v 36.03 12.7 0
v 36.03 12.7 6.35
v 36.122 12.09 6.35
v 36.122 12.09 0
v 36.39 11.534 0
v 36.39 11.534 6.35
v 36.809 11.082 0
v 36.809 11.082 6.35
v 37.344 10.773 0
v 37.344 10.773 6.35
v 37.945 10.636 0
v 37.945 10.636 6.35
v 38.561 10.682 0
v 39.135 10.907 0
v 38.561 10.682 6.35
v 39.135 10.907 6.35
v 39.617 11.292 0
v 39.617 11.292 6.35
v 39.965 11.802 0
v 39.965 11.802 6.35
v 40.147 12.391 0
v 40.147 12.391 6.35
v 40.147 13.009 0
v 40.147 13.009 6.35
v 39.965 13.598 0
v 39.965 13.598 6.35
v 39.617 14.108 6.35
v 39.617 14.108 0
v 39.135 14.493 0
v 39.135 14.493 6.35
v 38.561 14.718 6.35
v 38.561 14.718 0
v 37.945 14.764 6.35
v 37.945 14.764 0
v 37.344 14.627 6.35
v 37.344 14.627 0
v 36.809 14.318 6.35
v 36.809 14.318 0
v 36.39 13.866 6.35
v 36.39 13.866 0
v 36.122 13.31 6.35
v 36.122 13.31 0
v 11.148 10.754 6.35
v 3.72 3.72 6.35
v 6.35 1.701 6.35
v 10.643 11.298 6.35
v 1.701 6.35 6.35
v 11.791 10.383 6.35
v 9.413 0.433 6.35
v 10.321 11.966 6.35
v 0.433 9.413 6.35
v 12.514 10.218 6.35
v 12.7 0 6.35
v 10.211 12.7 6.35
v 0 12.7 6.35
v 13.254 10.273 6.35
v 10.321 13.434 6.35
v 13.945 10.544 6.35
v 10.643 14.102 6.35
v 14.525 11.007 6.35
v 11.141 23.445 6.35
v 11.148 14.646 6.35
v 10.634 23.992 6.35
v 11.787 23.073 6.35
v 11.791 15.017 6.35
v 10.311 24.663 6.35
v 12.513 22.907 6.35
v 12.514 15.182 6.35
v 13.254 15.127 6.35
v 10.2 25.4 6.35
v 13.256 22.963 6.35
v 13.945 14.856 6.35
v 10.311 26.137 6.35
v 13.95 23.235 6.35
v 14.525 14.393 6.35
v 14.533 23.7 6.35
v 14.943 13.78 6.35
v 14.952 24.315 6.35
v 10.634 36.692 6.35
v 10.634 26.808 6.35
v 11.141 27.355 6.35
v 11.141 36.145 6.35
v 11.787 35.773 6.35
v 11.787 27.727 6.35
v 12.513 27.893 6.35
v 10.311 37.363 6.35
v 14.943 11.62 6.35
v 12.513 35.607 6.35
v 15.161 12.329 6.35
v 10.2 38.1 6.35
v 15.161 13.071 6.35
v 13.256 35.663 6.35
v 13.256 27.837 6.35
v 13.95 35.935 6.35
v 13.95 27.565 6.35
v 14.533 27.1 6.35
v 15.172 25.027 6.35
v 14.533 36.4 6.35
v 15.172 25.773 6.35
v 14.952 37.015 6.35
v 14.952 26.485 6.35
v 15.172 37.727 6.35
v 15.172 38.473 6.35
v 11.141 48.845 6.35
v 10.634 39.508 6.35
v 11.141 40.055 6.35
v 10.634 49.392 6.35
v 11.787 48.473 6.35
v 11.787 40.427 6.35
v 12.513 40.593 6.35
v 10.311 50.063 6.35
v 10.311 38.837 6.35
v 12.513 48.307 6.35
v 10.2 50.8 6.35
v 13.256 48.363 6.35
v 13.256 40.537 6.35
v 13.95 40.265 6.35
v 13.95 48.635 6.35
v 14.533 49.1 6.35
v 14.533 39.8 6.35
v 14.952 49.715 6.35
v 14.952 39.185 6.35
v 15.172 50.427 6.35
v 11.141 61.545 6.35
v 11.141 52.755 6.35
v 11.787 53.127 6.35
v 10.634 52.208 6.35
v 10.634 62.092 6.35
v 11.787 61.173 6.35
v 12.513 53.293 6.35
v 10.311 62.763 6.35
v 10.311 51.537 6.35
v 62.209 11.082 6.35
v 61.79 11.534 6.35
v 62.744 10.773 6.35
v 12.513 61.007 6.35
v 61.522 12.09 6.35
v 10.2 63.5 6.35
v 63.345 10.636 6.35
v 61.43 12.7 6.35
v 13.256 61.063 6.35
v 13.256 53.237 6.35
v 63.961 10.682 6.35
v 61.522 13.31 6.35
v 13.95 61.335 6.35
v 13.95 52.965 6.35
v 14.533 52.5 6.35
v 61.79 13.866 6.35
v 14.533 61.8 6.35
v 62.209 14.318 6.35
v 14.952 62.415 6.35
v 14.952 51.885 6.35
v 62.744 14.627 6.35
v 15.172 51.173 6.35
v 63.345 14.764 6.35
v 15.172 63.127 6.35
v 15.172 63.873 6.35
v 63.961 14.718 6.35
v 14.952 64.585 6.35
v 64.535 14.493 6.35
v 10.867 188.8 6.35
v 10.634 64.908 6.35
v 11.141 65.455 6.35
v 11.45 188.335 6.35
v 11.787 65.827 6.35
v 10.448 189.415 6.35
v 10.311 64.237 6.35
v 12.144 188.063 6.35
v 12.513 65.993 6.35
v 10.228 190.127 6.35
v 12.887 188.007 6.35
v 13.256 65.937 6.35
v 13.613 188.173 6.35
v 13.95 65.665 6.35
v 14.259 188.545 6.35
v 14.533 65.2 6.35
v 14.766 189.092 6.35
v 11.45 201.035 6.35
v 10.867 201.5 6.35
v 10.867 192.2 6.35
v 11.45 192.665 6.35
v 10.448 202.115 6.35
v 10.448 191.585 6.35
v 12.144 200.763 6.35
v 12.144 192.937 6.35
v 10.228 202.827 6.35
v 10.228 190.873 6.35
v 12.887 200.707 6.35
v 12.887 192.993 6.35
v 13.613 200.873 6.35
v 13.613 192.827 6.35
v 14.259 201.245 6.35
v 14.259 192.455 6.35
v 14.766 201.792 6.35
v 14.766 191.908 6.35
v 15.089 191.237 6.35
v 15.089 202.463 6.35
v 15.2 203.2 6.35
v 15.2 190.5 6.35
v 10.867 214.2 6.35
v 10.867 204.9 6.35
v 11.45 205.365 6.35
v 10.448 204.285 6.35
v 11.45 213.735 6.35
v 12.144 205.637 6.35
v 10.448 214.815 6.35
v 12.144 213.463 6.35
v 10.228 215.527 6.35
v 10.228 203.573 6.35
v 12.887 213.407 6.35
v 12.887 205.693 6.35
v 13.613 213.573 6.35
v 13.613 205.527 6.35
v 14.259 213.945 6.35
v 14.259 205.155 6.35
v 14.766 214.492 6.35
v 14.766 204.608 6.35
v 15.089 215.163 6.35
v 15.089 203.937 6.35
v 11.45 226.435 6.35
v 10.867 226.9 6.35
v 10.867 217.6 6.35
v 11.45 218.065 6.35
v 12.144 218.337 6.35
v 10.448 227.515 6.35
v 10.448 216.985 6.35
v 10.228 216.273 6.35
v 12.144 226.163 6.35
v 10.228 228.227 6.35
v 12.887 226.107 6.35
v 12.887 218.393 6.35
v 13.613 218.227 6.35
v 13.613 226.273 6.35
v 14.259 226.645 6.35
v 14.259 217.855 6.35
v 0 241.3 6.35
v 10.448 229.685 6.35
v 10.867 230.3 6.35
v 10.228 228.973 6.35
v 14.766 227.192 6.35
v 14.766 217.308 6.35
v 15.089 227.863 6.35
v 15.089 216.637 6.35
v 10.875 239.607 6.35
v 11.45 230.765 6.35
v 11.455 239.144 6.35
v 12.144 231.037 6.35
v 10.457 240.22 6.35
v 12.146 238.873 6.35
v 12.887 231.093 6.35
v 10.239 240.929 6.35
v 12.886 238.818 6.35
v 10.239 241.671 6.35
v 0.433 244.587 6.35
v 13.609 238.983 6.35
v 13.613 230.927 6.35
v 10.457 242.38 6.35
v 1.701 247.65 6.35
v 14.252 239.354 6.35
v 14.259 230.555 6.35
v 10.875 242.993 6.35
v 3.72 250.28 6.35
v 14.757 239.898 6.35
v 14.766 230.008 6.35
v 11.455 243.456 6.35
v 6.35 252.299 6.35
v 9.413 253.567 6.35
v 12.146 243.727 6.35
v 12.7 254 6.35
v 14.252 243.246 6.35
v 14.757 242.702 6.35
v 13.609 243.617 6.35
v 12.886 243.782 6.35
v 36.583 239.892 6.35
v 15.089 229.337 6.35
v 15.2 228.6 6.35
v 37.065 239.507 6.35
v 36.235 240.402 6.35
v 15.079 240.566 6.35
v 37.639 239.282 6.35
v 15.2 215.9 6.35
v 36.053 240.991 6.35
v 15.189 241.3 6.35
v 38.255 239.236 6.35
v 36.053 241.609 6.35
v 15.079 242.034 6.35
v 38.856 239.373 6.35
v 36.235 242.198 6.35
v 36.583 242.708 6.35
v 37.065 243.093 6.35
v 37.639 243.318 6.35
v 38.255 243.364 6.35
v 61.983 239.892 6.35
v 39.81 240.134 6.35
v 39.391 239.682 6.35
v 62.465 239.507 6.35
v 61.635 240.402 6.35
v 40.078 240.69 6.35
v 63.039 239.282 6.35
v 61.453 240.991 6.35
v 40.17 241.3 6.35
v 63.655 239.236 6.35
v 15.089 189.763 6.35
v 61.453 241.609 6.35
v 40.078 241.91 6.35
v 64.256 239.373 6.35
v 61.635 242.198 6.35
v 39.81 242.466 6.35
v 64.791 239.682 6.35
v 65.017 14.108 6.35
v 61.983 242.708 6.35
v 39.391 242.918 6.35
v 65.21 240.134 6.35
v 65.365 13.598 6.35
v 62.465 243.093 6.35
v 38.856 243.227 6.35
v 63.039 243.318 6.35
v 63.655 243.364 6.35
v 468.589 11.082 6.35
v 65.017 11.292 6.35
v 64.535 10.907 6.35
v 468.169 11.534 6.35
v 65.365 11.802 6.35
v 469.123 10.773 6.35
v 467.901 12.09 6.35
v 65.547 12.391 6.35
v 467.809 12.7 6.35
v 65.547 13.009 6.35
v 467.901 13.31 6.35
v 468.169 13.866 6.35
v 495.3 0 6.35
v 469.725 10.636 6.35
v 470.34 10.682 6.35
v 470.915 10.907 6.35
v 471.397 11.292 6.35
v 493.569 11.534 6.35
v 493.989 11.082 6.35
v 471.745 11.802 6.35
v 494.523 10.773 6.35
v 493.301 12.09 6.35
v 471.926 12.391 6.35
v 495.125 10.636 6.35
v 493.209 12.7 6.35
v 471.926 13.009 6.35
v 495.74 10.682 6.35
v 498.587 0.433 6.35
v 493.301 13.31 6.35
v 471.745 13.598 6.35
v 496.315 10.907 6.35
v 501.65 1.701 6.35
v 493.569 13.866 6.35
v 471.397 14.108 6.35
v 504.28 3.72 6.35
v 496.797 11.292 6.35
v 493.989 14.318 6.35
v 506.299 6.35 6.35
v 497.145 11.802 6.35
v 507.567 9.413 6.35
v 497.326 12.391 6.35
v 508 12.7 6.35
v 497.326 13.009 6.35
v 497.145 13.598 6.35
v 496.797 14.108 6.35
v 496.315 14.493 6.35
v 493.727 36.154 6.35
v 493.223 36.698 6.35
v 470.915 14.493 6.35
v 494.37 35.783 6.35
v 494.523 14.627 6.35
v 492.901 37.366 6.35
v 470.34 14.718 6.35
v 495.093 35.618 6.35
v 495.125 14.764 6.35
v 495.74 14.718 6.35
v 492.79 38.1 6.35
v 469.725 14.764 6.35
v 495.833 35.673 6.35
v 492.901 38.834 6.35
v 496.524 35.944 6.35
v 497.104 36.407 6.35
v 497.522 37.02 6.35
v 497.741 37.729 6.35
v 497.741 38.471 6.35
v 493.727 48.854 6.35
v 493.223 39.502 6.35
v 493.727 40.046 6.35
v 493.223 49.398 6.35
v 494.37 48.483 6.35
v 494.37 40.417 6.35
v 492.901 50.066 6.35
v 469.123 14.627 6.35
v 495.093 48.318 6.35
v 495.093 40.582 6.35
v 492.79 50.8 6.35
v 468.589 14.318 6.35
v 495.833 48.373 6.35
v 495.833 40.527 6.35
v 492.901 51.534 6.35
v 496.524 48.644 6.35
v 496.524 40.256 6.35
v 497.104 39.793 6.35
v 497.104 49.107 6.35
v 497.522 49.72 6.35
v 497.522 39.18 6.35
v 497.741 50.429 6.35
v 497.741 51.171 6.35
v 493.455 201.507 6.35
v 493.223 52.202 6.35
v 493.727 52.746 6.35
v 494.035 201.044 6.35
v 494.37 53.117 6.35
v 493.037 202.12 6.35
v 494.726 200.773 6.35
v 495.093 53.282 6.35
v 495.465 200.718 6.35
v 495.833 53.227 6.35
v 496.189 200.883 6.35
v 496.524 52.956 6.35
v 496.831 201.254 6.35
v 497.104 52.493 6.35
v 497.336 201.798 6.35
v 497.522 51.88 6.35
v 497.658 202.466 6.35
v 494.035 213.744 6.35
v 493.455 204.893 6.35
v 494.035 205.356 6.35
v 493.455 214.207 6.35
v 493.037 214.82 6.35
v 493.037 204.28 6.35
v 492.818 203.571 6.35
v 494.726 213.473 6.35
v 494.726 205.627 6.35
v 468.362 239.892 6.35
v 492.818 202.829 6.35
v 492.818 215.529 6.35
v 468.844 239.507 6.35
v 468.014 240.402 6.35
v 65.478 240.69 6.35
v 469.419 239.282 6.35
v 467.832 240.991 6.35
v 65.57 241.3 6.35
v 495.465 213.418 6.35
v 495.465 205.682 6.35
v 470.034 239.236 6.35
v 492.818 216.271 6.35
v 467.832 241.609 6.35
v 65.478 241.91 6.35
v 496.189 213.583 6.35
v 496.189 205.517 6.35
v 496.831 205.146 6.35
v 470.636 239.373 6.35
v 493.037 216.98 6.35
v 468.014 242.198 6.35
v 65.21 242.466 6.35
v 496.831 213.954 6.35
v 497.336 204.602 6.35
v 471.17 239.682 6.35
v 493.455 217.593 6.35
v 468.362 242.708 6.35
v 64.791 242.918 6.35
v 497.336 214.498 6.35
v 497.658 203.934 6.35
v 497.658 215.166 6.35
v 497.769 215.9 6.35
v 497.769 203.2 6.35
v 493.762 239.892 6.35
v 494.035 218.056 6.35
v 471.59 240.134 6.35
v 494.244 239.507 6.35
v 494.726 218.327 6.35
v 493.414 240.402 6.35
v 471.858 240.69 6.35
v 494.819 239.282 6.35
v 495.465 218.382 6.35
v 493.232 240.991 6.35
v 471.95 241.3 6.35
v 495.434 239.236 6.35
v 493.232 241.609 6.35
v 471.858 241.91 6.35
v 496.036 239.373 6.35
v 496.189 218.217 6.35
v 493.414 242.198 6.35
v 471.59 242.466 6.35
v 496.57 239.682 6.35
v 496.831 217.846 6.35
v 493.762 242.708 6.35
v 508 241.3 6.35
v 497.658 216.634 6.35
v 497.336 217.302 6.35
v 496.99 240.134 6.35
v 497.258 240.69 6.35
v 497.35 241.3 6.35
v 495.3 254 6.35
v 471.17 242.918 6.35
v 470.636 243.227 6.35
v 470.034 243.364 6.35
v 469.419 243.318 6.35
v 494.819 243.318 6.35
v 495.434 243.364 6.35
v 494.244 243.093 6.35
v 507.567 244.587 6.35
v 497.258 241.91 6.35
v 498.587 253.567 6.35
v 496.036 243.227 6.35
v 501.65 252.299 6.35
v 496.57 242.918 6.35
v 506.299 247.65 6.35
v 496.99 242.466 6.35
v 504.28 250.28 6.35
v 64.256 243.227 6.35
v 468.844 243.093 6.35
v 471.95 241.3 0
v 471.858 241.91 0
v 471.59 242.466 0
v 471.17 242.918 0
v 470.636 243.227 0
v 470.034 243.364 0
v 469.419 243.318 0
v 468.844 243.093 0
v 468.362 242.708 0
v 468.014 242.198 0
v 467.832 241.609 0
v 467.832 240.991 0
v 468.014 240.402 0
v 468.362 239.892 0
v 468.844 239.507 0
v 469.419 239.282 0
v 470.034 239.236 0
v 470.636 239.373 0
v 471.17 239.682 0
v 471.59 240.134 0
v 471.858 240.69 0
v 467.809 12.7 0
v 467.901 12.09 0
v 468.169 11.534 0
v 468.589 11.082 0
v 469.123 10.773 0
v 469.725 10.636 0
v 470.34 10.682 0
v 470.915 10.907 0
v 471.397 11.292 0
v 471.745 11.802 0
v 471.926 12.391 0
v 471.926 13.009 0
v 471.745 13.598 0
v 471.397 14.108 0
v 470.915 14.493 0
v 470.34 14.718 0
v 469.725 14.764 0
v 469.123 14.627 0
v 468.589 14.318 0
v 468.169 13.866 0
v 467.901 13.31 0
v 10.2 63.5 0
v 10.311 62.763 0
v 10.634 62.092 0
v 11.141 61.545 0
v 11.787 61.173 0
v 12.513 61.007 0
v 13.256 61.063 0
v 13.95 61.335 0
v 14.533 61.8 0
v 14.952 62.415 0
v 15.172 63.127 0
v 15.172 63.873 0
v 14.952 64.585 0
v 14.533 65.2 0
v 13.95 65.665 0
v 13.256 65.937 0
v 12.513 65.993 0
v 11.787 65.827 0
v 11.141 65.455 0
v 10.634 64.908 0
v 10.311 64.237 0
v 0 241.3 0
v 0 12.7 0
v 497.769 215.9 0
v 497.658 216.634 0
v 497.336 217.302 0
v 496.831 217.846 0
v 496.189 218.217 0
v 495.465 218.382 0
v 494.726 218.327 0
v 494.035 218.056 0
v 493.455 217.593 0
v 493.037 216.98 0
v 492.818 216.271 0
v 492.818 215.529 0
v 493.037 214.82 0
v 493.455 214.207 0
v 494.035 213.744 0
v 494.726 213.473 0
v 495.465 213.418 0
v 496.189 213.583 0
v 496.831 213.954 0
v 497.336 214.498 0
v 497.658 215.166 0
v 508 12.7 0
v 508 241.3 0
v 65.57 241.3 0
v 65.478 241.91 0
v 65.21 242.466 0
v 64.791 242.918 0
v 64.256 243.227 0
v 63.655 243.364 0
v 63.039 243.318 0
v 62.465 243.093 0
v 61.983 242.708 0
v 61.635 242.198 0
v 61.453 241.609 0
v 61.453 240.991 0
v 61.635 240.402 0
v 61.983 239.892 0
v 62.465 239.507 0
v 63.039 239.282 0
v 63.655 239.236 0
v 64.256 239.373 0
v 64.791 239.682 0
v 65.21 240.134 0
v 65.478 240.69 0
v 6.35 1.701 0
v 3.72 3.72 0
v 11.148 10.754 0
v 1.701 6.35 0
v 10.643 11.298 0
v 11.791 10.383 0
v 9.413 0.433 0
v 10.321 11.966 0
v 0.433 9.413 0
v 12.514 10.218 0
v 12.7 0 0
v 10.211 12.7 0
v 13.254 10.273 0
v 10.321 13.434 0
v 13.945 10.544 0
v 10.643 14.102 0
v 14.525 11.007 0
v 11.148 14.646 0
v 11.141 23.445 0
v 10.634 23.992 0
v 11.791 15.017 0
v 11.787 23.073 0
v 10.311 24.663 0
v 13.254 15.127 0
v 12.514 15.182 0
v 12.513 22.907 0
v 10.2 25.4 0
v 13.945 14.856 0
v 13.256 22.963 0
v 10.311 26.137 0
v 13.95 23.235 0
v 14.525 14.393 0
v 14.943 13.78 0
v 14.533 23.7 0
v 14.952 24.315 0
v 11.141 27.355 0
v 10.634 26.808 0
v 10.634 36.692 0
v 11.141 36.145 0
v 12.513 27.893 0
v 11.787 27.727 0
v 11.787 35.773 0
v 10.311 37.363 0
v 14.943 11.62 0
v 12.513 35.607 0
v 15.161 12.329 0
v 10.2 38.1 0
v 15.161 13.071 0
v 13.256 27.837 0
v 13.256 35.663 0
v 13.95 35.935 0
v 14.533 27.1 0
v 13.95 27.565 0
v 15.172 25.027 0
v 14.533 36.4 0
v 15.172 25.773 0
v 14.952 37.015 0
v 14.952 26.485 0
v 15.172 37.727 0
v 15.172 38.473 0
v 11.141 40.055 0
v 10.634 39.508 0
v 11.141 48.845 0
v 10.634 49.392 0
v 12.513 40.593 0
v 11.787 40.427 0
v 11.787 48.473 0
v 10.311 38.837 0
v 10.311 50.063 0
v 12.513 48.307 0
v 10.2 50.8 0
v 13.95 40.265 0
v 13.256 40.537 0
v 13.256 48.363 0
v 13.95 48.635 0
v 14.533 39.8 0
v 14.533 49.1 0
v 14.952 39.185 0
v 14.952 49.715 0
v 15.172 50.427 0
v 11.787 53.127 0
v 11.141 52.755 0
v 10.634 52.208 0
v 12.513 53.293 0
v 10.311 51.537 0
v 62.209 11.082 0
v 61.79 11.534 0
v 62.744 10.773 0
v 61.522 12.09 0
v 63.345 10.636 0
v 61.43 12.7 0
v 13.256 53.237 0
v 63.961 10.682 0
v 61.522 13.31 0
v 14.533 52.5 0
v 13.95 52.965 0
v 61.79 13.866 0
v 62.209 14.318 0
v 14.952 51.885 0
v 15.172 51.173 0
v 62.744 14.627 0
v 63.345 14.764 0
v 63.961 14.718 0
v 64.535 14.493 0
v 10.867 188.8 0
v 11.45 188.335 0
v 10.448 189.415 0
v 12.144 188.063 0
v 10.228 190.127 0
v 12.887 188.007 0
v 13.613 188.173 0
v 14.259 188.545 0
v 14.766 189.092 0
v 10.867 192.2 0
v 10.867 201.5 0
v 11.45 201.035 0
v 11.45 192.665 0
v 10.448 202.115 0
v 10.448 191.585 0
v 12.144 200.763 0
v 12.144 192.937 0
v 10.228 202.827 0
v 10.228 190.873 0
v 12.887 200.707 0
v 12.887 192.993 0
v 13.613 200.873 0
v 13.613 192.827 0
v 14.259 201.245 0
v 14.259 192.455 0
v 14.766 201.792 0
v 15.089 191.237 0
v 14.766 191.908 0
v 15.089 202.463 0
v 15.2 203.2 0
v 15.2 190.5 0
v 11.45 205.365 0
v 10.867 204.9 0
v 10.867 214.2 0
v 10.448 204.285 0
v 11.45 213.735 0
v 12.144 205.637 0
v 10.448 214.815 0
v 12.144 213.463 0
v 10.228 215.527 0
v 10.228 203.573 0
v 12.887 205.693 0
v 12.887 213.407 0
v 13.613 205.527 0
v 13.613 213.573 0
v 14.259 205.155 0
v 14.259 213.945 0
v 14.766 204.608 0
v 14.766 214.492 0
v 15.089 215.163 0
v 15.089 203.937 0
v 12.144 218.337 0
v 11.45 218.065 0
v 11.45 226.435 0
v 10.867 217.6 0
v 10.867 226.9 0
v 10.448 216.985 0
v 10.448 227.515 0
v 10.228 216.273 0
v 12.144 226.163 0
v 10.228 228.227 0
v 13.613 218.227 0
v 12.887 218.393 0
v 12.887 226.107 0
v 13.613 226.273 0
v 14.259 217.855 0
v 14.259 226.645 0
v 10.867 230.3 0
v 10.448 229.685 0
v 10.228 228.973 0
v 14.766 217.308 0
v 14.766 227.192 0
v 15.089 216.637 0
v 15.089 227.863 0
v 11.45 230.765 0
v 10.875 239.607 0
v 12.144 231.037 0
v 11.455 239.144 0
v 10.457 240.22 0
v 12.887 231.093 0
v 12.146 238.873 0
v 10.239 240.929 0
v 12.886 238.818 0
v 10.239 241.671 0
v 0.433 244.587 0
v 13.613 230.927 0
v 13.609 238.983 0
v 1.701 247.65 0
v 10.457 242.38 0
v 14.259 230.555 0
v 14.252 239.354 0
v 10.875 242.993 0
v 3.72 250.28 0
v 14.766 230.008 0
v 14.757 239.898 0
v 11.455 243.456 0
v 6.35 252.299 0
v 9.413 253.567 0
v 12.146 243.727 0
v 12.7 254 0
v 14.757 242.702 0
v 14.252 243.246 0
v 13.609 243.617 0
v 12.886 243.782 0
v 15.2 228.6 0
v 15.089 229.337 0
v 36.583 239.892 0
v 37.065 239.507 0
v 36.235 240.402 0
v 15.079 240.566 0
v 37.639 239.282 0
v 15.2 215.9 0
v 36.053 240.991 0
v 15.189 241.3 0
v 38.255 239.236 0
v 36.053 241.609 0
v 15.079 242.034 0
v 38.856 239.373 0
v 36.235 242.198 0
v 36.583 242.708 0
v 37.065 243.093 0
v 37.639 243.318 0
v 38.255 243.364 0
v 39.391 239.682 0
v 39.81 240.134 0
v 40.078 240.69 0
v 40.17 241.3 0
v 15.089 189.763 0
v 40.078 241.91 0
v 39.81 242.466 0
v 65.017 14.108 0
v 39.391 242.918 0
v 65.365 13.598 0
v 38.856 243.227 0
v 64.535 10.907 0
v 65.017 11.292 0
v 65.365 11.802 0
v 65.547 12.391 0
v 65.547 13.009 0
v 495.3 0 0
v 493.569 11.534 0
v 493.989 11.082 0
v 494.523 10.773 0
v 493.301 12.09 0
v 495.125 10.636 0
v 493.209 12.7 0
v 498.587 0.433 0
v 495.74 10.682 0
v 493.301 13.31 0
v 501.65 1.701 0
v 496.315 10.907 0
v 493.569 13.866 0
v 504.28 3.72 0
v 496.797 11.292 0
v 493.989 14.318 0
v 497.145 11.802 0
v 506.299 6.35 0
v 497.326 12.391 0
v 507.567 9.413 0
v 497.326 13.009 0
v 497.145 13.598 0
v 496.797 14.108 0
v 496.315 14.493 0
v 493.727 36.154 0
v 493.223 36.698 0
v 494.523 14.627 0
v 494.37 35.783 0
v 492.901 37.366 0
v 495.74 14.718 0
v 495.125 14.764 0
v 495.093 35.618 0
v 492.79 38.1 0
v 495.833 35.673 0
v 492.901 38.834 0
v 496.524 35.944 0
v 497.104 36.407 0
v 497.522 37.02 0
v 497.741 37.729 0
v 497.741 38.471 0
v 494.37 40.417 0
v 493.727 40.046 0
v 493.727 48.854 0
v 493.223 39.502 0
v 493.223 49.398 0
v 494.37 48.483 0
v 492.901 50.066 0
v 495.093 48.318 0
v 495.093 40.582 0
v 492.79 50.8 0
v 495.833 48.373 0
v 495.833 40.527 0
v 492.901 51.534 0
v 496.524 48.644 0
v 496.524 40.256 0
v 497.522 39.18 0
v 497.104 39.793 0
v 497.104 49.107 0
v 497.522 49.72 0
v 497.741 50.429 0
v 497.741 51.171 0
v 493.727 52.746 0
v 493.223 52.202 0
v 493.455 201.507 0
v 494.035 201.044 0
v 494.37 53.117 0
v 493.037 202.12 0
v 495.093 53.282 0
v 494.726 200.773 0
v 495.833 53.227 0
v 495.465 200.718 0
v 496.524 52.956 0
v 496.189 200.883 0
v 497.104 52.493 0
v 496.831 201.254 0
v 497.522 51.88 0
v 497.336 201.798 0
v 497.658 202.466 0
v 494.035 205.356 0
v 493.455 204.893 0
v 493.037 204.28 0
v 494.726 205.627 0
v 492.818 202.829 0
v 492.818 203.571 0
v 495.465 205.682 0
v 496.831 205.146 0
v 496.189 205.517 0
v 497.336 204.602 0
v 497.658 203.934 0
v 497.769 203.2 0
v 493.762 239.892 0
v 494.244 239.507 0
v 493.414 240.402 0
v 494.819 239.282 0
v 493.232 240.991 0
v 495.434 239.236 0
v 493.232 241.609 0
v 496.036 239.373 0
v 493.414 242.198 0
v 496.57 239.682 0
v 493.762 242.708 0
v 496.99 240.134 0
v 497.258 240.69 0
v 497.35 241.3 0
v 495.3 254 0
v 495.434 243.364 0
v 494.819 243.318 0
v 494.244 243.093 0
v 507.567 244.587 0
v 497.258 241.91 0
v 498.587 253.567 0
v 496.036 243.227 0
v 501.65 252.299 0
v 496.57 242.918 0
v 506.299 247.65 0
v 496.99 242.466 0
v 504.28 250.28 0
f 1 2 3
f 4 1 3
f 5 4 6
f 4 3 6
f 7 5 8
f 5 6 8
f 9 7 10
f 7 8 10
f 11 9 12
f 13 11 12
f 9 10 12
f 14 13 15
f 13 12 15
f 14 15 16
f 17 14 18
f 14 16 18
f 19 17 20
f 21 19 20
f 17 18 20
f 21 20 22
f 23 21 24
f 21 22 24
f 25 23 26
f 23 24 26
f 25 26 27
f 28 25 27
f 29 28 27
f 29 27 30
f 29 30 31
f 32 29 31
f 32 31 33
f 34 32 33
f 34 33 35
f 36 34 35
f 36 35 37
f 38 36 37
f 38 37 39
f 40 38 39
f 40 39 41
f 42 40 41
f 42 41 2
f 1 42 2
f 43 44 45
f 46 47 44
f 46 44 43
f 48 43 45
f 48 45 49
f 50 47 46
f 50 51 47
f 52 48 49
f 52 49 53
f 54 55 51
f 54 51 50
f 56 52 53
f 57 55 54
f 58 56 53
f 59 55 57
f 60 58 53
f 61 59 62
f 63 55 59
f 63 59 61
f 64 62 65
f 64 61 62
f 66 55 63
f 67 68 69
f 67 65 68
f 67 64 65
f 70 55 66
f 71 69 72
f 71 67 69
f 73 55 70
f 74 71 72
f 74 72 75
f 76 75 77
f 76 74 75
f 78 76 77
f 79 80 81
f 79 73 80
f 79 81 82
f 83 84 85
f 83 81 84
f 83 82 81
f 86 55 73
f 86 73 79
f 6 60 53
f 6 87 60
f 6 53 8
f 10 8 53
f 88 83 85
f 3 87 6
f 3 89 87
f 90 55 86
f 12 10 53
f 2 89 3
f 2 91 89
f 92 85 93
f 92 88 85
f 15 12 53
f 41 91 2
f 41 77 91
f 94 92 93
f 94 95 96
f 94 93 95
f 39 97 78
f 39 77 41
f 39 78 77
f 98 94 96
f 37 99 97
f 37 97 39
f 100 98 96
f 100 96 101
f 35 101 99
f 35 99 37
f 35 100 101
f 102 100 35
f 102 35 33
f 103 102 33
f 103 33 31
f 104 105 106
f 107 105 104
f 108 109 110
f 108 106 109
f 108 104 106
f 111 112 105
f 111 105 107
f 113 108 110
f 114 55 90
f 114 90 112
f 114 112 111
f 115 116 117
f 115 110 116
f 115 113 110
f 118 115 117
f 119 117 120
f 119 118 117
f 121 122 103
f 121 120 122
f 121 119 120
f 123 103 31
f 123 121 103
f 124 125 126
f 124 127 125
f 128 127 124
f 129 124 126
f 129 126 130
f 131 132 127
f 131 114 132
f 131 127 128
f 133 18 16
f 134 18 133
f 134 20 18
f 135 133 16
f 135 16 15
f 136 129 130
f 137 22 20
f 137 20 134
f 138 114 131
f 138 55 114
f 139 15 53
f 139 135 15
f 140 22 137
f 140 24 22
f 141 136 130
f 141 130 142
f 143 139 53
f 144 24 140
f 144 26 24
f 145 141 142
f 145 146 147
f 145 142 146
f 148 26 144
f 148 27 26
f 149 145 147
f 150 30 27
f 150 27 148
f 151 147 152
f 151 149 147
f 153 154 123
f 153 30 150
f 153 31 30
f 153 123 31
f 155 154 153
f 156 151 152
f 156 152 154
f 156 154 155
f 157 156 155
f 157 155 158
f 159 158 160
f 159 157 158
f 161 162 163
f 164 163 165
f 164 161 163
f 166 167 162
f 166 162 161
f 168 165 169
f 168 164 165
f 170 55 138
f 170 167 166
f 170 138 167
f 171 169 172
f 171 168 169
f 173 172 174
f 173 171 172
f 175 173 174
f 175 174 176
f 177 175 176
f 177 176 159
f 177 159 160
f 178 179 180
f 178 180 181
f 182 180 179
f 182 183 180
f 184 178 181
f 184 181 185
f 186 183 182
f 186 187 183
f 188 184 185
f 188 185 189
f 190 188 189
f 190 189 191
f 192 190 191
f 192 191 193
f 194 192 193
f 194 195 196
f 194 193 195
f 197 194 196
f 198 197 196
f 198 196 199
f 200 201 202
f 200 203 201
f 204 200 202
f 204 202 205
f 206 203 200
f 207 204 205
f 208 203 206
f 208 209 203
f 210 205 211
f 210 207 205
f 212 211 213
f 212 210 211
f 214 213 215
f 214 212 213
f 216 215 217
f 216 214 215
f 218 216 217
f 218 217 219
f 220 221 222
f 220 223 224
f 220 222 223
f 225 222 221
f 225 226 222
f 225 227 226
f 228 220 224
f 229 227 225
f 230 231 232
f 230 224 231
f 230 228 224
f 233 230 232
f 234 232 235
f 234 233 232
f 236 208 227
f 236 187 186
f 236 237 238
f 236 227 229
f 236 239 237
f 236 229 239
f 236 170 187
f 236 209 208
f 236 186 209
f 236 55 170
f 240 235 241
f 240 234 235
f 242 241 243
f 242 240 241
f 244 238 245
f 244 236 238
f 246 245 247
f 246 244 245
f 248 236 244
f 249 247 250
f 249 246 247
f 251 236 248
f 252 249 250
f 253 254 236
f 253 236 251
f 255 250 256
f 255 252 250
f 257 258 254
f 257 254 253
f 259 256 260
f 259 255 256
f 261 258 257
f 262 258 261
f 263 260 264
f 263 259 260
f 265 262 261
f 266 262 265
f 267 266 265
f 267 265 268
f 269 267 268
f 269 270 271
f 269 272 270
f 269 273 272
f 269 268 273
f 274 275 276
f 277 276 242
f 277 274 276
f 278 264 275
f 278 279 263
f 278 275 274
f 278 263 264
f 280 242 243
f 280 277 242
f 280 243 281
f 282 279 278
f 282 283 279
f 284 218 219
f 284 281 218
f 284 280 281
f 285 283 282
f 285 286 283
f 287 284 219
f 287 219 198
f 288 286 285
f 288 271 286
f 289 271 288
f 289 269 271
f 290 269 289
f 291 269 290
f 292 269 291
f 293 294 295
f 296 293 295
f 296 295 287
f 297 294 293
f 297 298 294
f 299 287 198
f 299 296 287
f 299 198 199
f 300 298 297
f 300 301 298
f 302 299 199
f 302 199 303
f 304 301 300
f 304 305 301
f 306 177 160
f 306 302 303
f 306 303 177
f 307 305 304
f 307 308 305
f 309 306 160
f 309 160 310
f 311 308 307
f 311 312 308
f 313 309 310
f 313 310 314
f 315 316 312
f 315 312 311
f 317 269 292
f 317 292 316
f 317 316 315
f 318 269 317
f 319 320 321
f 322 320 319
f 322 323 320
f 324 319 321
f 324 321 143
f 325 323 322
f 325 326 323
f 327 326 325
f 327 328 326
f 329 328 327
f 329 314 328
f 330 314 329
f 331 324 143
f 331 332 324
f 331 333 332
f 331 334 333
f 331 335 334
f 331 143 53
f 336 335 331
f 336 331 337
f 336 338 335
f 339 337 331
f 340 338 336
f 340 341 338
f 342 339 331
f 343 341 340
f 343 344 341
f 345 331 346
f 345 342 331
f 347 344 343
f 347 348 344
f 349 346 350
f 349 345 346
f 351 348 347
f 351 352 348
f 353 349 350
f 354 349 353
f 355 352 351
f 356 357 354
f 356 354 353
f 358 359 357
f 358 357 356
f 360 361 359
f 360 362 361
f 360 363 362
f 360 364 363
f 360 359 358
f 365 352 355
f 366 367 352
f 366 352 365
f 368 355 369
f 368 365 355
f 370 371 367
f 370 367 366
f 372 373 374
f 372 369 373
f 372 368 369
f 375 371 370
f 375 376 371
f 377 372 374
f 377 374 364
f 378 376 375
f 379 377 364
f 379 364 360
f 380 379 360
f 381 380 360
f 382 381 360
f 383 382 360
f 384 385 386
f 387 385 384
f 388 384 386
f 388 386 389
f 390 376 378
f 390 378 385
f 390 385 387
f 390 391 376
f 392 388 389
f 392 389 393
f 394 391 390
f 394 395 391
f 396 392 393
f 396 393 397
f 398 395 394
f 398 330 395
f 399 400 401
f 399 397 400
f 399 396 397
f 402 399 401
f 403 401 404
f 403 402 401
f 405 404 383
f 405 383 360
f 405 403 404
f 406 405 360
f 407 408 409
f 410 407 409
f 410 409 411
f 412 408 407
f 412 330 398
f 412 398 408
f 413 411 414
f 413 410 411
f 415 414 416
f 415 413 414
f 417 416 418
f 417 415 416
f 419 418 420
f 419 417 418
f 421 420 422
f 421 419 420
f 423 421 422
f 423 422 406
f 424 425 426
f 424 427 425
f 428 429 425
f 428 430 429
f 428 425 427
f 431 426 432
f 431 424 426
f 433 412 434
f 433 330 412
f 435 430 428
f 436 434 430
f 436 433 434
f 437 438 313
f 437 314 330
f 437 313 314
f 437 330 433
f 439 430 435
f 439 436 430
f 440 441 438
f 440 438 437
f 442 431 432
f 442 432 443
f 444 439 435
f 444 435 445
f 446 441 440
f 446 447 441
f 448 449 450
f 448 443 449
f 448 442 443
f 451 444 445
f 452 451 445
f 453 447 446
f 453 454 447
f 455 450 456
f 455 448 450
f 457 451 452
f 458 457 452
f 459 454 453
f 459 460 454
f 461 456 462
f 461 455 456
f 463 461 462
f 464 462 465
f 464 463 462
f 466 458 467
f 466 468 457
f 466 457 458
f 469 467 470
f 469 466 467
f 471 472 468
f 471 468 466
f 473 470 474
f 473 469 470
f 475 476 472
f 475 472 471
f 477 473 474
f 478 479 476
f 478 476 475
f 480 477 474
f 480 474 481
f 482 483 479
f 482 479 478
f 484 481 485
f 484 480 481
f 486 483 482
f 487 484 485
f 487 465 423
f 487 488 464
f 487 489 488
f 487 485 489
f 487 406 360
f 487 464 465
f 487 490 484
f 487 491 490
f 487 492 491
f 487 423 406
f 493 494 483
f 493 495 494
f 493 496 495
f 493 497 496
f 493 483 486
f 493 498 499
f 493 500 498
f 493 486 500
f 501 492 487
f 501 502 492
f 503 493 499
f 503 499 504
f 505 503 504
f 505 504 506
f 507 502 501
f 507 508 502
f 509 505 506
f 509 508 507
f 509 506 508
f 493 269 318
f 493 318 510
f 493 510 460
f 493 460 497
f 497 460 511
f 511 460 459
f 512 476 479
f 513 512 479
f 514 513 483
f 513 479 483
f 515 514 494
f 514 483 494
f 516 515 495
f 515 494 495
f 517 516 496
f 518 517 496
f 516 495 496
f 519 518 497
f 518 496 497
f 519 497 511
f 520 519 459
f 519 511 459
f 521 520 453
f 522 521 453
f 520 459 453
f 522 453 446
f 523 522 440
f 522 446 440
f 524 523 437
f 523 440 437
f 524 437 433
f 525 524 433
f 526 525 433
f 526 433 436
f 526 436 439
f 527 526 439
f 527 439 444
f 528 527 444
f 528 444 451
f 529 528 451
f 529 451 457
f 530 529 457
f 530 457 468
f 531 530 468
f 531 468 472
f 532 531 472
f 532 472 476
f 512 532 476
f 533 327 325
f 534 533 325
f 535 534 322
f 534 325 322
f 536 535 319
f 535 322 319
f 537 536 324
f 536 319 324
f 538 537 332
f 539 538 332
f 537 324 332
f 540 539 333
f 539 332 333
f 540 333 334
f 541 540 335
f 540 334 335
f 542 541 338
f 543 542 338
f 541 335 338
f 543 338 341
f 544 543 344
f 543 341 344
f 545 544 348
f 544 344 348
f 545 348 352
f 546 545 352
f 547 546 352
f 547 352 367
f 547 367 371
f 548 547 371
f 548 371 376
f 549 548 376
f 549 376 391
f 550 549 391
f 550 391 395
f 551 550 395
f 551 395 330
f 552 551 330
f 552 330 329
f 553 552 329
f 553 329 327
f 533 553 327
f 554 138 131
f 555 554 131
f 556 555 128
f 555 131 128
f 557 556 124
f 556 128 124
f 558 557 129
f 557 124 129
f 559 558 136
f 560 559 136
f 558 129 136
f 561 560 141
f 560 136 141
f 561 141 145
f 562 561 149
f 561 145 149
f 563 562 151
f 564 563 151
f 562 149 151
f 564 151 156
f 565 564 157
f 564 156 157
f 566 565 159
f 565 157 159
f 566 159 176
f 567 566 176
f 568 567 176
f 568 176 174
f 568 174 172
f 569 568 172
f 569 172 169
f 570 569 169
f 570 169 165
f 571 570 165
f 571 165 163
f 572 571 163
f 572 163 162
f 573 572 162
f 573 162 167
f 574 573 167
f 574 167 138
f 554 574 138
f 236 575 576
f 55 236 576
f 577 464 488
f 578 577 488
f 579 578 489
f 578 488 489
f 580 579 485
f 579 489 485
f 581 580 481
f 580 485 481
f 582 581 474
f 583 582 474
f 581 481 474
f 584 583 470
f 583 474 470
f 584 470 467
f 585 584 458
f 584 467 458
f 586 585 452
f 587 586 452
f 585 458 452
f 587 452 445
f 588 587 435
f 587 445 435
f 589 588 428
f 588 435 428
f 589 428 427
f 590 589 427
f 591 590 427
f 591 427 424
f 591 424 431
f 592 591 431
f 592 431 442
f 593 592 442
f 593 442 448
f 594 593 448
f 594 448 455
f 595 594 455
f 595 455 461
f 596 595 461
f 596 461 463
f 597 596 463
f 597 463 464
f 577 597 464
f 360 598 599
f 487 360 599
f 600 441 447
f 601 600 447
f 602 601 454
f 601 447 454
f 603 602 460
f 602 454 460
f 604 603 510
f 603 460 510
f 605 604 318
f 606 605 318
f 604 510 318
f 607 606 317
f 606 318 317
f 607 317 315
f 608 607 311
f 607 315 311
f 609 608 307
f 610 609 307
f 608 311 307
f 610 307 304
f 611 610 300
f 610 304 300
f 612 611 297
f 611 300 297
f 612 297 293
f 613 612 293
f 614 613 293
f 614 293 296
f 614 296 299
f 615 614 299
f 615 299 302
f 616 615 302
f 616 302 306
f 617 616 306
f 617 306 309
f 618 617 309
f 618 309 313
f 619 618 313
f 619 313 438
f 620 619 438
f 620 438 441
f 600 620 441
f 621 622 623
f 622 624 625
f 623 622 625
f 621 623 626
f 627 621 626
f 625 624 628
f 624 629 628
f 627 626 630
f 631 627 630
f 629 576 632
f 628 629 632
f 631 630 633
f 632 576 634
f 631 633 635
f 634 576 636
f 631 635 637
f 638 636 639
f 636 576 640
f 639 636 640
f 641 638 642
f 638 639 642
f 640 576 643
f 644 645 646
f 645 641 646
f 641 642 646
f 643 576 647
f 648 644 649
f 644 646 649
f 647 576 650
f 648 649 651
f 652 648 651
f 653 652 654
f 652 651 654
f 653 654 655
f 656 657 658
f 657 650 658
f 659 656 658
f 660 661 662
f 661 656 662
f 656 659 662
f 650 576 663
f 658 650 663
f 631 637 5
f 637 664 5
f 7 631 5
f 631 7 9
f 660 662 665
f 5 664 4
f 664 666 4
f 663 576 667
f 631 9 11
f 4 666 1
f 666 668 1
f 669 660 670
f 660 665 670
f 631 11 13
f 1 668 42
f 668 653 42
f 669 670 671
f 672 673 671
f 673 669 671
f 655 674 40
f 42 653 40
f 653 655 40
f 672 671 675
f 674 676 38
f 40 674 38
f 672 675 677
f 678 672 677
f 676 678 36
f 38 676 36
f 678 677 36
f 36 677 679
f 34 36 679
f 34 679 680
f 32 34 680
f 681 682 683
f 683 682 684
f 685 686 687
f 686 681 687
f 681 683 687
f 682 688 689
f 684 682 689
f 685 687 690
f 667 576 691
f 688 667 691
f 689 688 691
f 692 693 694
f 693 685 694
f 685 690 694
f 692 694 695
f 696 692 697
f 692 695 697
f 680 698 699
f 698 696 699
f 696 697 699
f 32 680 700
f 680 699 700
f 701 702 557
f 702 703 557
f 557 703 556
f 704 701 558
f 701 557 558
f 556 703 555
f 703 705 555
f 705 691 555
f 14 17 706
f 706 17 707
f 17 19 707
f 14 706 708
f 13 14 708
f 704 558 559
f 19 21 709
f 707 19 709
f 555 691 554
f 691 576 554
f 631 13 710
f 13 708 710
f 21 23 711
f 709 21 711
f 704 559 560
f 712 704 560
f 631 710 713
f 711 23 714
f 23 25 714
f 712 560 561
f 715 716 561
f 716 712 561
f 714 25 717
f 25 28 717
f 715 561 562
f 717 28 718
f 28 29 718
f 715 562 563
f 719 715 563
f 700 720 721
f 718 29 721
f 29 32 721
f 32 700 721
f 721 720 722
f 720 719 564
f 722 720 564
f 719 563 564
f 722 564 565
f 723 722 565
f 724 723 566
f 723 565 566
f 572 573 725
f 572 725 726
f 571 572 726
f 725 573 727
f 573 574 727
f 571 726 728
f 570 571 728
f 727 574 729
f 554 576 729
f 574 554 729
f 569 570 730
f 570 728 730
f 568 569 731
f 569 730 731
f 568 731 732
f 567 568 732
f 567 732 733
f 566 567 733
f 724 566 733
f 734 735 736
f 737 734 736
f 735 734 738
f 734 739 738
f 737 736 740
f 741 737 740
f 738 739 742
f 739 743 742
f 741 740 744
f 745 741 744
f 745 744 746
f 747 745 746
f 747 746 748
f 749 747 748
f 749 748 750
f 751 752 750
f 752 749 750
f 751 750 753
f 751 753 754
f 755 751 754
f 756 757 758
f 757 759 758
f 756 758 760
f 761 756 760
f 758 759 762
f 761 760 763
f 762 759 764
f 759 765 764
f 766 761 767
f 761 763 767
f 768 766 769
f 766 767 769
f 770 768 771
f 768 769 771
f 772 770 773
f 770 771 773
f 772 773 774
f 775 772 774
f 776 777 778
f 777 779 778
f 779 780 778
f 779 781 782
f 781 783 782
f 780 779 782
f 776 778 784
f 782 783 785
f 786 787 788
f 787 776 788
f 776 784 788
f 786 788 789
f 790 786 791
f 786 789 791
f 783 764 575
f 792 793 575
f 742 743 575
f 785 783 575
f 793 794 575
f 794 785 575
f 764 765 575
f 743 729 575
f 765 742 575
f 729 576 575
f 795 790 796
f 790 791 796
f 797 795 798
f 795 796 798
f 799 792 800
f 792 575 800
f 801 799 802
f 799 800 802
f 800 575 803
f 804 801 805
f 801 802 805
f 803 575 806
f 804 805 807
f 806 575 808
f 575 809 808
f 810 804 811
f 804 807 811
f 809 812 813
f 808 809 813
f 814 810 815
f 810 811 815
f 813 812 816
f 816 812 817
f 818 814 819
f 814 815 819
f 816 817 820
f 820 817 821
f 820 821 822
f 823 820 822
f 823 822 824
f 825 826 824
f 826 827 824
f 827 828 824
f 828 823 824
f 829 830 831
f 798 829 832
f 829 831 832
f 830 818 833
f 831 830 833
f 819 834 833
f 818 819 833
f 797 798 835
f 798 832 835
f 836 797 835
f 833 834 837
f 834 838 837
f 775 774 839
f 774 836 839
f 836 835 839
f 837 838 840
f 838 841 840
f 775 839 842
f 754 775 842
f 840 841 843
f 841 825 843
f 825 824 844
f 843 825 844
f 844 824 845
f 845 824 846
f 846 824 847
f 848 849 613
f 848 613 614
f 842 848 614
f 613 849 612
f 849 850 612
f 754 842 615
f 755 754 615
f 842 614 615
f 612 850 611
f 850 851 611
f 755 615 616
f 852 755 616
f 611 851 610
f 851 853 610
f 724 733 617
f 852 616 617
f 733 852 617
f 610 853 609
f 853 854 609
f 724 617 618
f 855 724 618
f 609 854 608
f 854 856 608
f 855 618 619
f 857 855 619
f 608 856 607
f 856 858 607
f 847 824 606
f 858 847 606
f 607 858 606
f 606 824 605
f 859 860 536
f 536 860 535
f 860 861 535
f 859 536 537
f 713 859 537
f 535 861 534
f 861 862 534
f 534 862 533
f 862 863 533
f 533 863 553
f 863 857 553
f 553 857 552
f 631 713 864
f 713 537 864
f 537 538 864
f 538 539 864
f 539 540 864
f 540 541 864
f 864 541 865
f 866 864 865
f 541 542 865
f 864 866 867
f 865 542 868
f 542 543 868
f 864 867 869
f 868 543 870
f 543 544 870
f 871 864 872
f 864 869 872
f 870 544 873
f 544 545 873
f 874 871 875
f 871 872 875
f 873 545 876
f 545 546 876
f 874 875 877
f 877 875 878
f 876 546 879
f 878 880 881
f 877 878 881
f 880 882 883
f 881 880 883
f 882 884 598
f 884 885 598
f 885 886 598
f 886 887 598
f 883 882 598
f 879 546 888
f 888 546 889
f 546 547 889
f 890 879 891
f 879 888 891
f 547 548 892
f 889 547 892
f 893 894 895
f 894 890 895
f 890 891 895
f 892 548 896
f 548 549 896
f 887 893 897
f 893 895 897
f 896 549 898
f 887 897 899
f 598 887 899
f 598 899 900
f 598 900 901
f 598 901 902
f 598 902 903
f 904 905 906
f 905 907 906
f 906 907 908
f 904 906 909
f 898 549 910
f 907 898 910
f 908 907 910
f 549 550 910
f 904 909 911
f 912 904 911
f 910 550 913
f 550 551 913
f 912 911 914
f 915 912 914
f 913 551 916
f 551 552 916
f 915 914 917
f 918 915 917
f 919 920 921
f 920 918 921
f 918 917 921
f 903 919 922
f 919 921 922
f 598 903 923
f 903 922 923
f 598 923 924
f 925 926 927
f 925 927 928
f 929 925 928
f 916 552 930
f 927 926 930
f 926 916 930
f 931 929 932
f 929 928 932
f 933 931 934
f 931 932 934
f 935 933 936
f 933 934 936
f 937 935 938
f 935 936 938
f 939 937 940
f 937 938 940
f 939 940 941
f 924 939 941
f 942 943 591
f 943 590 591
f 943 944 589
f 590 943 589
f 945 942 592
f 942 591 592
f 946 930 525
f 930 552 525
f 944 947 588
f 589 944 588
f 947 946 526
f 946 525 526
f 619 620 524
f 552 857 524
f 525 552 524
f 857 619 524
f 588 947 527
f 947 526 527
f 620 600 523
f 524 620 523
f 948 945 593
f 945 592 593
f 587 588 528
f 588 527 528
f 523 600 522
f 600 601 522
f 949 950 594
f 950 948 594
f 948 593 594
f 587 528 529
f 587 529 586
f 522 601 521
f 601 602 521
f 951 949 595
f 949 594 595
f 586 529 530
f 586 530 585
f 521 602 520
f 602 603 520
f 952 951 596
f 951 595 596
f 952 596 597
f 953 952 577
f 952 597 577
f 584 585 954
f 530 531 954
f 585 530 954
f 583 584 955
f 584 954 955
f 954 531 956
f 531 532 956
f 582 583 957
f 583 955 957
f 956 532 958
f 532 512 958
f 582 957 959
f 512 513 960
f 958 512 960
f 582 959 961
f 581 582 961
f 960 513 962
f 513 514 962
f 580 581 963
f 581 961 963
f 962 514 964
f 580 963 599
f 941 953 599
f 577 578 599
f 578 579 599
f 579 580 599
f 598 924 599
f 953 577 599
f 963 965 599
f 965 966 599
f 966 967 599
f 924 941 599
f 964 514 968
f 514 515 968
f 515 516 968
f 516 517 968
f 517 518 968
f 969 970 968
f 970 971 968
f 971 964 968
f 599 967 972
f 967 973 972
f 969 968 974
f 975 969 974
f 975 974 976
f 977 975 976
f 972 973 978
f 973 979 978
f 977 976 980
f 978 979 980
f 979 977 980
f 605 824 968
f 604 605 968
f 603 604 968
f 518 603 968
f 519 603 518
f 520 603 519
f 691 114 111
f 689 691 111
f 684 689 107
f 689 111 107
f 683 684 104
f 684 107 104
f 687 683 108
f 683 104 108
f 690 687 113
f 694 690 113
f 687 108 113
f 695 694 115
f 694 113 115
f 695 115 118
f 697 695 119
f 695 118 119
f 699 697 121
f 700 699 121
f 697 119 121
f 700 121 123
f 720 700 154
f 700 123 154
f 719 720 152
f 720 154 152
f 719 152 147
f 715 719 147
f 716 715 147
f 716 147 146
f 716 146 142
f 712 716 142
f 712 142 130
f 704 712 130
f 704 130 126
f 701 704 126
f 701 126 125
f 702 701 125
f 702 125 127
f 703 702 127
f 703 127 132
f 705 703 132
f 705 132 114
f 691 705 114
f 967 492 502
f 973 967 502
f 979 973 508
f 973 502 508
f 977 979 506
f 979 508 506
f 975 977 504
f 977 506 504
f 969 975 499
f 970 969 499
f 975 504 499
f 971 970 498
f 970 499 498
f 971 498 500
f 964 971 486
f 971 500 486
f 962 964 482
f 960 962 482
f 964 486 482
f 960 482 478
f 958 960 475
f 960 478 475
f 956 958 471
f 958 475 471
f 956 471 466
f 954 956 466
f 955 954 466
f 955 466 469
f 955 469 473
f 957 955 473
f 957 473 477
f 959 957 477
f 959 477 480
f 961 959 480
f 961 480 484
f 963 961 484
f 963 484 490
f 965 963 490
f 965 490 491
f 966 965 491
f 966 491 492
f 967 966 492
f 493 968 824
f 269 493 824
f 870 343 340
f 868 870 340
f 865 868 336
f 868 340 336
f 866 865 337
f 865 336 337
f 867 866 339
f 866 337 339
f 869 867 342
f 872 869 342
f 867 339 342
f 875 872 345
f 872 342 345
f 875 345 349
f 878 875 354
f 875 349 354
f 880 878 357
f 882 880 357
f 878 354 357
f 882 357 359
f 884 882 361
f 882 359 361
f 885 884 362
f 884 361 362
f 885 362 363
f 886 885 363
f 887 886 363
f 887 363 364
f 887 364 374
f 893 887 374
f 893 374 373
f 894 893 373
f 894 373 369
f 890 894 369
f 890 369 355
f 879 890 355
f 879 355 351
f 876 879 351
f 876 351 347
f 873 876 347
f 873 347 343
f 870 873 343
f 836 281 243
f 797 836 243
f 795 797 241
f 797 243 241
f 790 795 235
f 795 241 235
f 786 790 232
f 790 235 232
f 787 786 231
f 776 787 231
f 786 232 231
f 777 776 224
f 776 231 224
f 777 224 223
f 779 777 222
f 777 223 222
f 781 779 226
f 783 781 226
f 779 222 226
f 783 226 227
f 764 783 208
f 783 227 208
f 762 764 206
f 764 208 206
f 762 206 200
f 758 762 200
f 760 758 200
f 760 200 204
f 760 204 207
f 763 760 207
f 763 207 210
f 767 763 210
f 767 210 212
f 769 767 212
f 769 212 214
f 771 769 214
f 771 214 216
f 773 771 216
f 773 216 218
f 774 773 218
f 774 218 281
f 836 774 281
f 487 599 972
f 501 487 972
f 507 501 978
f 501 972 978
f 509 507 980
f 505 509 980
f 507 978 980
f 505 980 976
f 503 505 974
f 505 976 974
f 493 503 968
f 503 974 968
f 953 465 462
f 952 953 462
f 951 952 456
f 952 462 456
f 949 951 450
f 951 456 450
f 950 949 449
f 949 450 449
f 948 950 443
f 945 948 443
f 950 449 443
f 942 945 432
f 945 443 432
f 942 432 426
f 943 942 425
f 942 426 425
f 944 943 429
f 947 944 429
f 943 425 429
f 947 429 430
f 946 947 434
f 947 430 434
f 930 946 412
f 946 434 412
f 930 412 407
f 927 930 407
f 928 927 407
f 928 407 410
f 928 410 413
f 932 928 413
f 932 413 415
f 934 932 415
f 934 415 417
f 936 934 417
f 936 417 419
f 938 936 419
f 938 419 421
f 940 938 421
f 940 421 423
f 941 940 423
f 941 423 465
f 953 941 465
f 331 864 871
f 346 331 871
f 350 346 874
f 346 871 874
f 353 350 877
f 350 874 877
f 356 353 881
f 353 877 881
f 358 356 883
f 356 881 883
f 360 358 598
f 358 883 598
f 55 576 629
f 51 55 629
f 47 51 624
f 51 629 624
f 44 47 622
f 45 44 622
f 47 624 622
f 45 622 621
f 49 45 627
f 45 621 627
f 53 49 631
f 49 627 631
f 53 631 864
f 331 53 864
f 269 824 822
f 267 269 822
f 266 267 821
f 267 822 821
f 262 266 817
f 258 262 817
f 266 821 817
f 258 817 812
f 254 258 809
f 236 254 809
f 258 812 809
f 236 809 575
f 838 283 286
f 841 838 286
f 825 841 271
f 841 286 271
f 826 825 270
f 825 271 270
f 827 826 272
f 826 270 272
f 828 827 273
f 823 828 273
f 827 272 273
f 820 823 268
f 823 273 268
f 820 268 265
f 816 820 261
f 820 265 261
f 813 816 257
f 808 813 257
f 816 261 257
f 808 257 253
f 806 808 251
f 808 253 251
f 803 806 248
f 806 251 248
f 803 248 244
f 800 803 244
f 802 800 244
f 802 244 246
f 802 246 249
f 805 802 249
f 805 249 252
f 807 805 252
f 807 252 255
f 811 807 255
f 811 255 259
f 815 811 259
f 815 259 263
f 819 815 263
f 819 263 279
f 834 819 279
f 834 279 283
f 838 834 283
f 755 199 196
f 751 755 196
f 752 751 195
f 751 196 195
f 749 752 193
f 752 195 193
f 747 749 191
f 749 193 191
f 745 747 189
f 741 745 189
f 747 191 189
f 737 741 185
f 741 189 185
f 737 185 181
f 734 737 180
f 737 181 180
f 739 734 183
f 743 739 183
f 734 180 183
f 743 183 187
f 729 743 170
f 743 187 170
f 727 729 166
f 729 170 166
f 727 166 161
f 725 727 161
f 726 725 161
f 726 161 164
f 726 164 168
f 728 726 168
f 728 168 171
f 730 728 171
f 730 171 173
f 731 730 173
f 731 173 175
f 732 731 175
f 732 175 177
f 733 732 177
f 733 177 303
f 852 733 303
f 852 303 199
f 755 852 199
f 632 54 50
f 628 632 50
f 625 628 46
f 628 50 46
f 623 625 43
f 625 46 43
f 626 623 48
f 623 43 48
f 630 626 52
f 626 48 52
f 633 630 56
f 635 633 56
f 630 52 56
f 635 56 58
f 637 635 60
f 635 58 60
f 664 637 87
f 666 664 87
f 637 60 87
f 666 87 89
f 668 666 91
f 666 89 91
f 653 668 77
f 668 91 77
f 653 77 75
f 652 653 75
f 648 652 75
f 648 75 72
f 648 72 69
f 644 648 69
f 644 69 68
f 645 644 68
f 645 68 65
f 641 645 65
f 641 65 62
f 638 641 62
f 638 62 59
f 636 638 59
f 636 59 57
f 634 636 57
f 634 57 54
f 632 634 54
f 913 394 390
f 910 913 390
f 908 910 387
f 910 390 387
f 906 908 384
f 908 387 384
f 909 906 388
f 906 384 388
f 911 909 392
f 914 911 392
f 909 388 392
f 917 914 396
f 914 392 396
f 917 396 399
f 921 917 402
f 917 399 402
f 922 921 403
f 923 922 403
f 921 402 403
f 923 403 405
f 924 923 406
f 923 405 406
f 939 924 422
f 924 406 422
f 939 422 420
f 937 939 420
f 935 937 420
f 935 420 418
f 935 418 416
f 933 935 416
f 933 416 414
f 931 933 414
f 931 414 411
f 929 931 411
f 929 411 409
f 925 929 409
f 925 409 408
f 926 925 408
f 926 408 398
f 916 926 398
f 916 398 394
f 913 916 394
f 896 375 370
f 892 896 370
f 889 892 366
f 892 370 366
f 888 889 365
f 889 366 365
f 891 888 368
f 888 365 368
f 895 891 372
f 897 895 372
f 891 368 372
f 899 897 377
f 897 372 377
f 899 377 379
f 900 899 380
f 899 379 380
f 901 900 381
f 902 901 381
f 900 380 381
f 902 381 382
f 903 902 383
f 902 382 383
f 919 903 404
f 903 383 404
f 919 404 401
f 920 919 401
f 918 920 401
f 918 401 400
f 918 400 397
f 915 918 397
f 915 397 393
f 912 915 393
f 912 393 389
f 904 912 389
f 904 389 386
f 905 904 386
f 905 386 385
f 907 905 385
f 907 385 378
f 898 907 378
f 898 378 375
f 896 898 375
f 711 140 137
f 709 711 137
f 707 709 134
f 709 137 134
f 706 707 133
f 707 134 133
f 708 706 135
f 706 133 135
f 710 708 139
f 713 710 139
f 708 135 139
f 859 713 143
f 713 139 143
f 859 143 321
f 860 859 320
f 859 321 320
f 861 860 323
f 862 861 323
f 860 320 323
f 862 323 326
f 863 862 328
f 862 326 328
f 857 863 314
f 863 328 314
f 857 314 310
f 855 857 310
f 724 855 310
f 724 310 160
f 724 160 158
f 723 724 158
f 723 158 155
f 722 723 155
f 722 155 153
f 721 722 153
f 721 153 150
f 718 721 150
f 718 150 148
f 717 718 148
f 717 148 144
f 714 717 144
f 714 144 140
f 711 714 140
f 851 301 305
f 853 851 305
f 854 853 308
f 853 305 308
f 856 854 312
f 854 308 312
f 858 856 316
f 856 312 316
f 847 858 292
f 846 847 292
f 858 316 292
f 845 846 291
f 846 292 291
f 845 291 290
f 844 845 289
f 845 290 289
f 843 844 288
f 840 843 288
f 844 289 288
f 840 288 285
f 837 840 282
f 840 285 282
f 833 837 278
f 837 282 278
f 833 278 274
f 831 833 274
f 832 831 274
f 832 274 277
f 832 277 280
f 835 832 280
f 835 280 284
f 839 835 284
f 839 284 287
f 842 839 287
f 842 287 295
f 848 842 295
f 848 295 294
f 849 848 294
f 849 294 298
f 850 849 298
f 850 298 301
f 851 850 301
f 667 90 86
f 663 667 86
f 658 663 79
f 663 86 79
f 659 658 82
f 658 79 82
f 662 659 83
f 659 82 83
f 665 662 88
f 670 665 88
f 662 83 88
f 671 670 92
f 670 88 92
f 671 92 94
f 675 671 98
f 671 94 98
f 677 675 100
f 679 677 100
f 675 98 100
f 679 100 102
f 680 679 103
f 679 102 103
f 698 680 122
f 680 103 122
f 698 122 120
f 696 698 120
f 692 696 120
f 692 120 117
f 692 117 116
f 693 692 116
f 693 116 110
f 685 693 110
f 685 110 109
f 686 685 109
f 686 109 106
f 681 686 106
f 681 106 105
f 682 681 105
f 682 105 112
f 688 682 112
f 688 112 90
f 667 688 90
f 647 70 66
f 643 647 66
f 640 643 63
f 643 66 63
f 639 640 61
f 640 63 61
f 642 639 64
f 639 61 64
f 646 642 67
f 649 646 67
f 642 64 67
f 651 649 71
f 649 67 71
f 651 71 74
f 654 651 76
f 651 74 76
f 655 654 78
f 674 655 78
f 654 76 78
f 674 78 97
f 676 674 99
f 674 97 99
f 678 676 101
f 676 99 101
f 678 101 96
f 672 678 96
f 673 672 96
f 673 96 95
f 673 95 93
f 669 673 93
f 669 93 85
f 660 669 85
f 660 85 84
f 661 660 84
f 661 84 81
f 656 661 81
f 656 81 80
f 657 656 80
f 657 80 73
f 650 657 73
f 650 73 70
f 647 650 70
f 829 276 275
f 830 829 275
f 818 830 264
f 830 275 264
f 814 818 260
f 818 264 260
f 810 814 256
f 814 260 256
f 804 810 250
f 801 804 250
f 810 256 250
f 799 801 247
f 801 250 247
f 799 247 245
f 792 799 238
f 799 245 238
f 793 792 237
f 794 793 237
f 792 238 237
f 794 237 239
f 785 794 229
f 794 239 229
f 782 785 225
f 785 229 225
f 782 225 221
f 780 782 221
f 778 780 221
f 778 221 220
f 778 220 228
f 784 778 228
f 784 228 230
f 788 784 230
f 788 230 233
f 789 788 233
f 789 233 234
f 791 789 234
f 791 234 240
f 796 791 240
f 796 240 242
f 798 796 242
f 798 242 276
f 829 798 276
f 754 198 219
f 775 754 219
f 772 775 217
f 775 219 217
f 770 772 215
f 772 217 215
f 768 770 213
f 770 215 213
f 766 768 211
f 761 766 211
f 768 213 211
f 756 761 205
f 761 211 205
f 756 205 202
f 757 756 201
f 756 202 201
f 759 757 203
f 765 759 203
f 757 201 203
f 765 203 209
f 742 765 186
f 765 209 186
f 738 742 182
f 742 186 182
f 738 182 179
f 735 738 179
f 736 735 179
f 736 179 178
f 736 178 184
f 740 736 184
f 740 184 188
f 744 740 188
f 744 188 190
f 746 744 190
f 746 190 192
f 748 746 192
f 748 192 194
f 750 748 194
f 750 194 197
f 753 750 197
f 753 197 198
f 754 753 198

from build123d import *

# Parameters (mm, degrees)
BOSS_EXTRUDE1_DEPTH = 6.35
SKETCH2_R           = 2.5
SKETCH2_R_2         = 2.4892
SKETCH2_R_3         = 2.0701
CUT_EXTRUDE1_DEPTH  = 568.996762755
SKETCH3_R           = 2.0701
SKETCH3_R_2         = 2.4892
CUT_EXTRUDE2_DEPTH  = 568.996762755


with BuildPart() as part:
    # Sketch1 → Boss-Extrude1 (new body)
    with BuildSketch(Plane.XY):
        with BuildLine():
            Line((12.7, 0), (495.3, 0))
            ThreePointArc((495.3, 0), (504.280256121, 3.719743879), (508, 12.7))
            Line((508, 12.7), (508, 241.3))
            ThreePointArc((508, 241.3), (504.280256121, 250.280256121), (495.3, 254))
            Line((495.3, 254), (12.7, 254))
            ThreePointArc((12.7, 254), (3.719743879, 250.280256121), (0, 241.3))
            Line((0, 241.3), (0, 12.7))
            ThreePointArc((0, 12.7), (3.719743879, 3.719743879), (12.7, 0))
        make_face()
    extrude(amount=BOSS_EXTRUDE1_DEPTH)

    # Sketch2 → Cut-Extrude1 (cut, through all)
    with BuildSketch(Plane.XY.offset(6.35)):
        with Locations((12.7, 190.5)):
            Circle(SKETCH2_R)
        with Locations((12.7, 203.2)):
            Circle(SKETCH2_R)
        with Locations((12.7, 215.9)):
            Circle(SKETCH2_R)
        with Locations((12.7, 228.6)):
            Circle(SKETCH2_R)
        with Locations((12.7, 241.3)):
            Circle(SKETCH2_R_2)
        with Locations((38.1, 241.3)):
            Circle(SKETCH2_R_3)
        with Locations((63.5, 241.3)):
            Circle(SKETCH2_R_3)
        with Locations(Location((63.5, 12.7, 0), (0, 0, 180))):
            Circle(SKETCH2_R_3)
        with Locations(Location((38.1, 12.7, 0), (0, 0, 180))):
            Circle(SKETCH2_R_3)
        with Locations(Location((12.7, 63.5, 0), (0, 0, 180))):
            Circle(SKETCH2_R)
        with Locations(Location((12.7, 50.8, 0), (0, 0, 180))):
            Circle(SKETCH2_R)
        with Locations(Location((12.7, 38.1, 0), (0, 0, 180))):
            Circle(SKETCH2_R)
        with Locations(Location((12.7, 25.4, 0), (0, 0, 180))):
            Circle(SKETCH2_R)
        with Locations(Location((12.7, 12.7, 0), (0, 0, 180))):
            Circle(SKETCH2_R_2)
    extrude(amount=-CUT_EXTRUDE1_DEPTH, mode=Mode.SUBTRACT)

    # Sketch3 → Cut-Extrude2 (cut, through all)
    with BuildSketch(Plane.XY.offset(6.35)):
        with Locations((469.879454624, 241.3)):
            Circle(SKETCH3_R)
        with Locations((495.279454624, 241.3)):
            Circle(SKETCH3_R)
        with Locations((495.279454624, 215.9)):
            Circle(SKETCH3_R_2)
        with Locations((495.279454624, 203.2)):
            Circle(SKETCH3_R_2)
        with Locations(Location((469.879454624, 12.7, 0), (0, 0, 180))):
            Circle(SKETCH3_R)
        with Locations(Location((495.279454624, 12.7, 0), (0, 0, 180))):
            Circle(SKETCH3_R)
        with Locations(Location((495.279454624, 38.1, 0), (0, 0, 180))):
            Circle(SKETCH3_R_2)
        with Locations(Location((495.279454624, 50.8, 0), (0, 0, 180))):
            Circle(SKETCH3_R_2)
    extrude(amount=-CUT_EXTRUDE2_DEPTH, mode=Mode.SUBTRACT)


solid = part.part
